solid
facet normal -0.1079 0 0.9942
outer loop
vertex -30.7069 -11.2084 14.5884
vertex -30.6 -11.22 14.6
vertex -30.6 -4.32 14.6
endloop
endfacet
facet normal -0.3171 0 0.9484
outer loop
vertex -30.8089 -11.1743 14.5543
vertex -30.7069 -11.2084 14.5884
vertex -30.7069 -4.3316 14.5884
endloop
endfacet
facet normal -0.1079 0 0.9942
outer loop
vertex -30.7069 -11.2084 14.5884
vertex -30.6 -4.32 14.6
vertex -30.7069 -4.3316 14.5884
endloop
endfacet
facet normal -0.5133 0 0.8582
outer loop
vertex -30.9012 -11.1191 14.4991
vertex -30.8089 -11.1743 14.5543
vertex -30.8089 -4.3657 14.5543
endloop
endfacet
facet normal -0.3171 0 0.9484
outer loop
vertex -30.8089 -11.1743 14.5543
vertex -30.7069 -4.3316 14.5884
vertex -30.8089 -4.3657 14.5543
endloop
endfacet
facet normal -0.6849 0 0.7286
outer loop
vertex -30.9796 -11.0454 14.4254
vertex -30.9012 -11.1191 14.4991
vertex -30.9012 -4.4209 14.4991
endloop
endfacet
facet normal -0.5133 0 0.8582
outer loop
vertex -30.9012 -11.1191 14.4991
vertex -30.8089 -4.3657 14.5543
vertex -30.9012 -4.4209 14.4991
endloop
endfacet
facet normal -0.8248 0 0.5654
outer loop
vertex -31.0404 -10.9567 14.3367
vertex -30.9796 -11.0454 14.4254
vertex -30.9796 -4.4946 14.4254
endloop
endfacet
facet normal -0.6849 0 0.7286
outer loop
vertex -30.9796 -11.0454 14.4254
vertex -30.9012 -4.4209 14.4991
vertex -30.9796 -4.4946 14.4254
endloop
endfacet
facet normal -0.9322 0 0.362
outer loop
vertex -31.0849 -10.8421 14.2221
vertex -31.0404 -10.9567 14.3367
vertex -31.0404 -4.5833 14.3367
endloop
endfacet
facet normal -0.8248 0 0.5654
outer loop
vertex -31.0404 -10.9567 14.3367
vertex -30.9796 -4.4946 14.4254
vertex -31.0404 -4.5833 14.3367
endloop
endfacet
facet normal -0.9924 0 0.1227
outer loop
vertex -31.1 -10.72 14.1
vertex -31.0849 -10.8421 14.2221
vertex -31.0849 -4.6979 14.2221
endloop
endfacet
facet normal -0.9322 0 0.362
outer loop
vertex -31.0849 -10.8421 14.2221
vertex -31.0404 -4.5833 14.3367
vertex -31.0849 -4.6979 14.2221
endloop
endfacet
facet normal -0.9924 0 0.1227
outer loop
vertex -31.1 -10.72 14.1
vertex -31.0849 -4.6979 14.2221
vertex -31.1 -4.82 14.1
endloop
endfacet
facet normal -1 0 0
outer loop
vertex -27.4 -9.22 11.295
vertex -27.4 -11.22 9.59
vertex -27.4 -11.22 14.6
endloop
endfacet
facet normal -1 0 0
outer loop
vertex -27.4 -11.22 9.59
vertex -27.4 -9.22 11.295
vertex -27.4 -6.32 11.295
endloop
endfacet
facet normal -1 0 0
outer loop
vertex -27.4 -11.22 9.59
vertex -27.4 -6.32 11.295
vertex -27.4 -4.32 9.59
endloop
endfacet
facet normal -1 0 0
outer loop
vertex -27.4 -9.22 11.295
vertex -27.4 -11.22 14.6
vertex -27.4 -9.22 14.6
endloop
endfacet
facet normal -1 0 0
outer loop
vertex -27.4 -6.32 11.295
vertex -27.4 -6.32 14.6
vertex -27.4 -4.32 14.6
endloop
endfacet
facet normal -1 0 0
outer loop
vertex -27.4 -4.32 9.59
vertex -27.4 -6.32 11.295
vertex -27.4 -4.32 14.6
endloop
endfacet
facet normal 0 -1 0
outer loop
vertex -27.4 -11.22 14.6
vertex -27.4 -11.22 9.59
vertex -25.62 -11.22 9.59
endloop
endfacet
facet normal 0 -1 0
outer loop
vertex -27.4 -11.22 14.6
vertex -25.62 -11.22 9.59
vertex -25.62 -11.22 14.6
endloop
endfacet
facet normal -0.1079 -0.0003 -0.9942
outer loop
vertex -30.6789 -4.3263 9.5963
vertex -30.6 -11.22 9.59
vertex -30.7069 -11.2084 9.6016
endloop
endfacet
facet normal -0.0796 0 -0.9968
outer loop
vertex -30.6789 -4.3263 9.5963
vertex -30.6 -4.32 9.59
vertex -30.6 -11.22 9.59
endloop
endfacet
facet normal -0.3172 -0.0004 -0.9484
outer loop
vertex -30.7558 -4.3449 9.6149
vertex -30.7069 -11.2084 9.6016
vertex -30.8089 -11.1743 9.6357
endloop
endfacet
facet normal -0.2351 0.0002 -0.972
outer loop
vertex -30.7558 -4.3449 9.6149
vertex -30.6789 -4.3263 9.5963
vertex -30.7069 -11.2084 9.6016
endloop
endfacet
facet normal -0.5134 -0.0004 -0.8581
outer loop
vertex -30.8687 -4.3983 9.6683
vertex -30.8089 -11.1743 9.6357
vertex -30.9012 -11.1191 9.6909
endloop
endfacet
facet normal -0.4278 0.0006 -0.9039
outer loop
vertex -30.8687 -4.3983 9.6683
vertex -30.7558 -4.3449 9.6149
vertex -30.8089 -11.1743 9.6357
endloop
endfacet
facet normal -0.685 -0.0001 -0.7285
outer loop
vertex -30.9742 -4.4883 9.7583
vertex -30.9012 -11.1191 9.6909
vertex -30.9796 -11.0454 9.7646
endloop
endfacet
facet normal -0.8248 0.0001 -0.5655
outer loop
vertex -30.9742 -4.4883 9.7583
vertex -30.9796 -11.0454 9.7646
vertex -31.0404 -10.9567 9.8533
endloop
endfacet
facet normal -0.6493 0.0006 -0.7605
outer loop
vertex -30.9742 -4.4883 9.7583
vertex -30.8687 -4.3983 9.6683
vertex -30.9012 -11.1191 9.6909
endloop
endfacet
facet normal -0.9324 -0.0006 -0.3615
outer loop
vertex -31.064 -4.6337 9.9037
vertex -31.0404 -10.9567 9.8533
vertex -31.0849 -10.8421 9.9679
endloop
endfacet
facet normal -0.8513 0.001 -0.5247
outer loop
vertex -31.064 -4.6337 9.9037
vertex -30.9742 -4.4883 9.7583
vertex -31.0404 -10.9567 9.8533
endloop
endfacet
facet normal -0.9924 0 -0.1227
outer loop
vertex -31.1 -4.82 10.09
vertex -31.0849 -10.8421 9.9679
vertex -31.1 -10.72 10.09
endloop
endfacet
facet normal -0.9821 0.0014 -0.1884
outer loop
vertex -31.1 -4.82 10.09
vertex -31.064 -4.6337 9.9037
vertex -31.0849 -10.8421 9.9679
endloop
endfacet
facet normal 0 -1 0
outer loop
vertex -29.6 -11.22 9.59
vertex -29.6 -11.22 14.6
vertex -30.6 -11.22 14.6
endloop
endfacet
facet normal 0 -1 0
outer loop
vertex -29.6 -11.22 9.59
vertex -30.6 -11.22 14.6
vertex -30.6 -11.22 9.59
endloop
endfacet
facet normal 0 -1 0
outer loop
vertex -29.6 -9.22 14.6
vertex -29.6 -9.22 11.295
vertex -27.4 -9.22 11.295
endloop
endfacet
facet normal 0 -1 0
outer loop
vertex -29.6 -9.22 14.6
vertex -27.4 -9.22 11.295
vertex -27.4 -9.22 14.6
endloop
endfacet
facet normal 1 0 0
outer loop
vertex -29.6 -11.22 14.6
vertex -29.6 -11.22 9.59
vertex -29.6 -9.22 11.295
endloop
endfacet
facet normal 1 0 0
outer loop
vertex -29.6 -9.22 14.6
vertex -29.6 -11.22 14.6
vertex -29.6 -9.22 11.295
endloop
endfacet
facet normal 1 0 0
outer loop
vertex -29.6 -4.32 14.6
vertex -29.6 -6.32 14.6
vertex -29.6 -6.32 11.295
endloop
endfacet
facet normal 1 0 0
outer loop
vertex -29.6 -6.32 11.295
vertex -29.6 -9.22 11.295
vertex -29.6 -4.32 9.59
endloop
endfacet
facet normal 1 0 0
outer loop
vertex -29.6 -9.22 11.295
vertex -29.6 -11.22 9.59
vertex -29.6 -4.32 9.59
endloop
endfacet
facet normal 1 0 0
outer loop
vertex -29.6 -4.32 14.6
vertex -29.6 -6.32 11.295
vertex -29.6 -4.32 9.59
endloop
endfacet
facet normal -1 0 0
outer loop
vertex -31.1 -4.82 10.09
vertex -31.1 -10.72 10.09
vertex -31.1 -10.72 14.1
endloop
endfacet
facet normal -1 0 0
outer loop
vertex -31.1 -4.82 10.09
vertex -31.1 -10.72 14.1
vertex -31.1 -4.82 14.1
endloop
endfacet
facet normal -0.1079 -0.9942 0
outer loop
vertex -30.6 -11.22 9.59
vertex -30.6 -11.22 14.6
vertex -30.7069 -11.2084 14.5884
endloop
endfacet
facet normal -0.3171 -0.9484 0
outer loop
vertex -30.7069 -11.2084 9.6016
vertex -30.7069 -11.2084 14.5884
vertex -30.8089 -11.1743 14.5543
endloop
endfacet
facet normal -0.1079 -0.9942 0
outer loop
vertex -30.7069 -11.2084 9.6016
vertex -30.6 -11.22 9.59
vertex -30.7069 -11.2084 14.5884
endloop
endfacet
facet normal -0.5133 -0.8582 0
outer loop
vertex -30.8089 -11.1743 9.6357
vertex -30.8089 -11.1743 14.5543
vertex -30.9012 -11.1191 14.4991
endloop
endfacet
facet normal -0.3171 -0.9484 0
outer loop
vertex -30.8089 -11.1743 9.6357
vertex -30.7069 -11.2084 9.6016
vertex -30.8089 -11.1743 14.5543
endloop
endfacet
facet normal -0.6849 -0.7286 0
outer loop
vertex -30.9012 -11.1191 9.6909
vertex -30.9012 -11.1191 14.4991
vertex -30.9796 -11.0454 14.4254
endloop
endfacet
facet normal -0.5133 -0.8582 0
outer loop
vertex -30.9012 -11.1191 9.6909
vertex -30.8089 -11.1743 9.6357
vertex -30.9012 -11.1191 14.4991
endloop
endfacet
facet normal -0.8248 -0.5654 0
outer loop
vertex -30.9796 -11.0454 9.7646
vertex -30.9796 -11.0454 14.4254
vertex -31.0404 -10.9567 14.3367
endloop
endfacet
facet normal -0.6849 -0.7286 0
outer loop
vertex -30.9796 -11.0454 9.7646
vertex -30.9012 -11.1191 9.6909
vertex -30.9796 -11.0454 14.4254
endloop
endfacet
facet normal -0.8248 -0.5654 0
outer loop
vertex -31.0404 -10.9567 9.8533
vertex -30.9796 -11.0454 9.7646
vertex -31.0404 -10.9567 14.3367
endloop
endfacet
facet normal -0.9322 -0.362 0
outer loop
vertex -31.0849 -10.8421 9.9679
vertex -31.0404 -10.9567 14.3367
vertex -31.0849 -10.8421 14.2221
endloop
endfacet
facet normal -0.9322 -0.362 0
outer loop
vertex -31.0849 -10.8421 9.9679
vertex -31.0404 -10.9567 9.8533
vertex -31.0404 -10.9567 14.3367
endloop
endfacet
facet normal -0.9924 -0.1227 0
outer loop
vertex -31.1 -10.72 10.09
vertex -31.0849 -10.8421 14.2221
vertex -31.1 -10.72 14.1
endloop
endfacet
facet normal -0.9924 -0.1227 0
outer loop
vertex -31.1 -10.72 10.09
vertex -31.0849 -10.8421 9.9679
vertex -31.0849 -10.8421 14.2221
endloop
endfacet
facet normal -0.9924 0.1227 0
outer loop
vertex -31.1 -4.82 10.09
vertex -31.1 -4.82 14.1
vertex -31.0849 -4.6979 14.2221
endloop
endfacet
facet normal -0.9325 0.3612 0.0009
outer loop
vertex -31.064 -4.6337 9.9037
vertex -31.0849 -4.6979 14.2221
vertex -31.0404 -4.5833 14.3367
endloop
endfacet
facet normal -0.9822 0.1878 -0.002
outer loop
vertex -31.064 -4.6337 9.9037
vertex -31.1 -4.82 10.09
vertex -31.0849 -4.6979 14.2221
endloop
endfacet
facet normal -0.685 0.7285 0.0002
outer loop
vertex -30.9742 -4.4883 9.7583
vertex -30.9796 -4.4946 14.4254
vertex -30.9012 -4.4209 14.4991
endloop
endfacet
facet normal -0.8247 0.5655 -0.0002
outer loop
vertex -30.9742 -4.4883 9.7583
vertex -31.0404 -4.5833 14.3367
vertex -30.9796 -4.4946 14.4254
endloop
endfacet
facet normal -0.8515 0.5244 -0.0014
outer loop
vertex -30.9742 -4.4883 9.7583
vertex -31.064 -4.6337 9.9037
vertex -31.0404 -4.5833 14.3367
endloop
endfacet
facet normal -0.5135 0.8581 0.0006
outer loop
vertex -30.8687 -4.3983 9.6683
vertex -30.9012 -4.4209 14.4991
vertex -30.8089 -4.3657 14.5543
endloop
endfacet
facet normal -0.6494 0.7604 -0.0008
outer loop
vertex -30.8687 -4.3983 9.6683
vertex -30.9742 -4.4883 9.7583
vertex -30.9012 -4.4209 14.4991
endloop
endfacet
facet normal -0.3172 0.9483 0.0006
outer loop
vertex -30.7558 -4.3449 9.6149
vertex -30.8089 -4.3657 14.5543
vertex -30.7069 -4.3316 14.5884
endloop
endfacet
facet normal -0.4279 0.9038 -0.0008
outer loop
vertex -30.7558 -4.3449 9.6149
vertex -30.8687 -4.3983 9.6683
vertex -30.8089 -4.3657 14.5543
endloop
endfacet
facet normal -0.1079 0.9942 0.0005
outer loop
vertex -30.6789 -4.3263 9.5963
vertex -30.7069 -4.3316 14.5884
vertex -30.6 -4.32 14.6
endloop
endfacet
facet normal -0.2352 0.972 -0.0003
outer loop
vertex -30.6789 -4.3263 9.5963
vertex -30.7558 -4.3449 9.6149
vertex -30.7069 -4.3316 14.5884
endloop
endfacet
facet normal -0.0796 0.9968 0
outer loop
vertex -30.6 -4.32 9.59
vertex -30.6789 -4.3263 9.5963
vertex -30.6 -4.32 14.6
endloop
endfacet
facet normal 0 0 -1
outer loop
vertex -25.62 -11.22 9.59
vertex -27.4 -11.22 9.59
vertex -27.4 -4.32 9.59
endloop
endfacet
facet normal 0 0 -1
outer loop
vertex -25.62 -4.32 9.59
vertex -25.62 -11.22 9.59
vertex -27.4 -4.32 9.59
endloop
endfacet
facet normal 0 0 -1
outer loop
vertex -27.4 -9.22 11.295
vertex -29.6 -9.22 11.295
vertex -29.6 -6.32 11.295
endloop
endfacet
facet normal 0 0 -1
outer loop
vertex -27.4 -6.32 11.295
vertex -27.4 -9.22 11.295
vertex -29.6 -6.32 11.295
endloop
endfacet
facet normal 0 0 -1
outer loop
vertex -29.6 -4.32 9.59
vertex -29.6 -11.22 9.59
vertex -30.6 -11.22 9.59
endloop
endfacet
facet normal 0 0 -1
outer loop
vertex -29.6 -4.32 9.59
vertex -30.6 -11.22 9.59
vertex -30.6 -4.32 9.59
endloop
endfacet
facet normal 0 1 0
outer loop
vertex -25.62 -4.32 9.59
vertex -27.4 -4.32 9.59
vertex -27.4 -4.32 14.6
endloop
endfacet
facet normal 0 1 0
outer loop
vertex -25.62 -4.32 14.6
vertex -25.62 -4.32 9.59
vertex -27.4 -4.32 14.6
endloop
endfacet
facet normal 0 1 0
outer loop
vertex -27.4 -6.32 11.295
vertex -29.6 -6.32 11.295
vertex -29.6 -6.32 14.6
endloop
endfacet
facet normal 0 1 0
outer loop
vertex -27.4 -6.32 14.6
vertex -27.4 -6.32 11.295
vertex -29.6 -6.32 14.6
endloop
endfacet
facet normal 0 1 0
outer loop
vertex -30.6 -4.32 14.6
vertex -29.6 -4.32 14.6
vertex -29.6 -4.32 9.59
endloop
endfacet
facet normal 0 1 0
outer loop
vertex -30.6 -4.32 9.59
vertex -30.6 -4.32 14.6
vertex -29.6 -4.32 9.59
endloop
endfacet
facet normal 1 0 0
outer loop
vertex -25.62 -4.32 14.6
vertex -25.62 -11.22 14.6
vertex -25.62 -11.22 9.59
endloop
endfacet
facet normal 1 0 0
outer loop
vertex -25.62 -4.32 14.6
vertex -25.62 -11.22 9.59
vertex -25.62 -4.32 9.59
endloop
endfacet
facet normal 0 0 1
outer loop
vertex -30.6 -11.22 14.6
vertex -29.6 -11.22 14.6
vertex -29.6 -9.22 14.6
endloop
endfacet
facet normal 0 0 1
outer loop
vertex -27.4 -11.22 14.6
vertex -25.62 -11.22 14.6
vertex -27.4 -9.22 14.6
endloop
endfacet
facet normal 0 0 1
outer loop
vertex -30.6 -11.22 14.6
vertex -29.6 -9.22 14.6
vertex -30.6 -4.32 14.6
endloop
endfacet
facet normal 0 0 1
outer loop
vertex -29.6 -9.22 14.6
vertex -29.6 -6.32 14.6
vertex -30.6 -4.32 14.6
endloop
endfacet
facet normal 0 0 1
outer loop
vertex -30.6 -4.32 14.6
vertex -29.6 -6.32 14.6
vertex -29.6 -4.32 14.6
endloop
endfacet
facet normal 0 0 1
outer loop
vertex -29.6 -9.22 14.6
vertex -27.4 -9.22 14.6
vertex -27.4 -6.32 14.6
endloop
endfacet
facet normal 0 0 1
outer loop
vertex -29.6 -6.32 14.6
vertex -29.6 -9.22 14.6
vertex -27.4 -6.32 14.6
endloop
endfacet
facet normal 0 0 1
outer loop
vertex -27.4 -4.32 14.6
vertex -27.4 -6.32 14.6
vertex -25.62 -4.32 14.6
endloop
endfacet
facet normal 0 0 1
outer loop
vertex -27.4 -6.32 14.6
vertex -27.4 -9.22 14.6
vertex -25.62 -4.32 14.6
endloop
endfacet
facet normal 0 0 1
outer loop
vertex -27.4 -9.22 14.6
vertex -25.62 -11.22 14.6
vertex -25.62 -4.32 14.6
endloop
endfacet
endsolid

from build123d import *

# Parameters (mm, degrees)
SKETCH083_W  = 2.9
SKETCH083_H  = 3.305
PAD042_DEPTH = 2.2
SKETCH084_W  = 6.9
SKETCH084_H  = 5.01
PAD043_DEPTH = 1.78
SKETCH085_W  = 6.9
SKETCH085_H  = 5.01
PAD044_DEPTH = 1.5
FILLET006_R  = 0.5


with BuildPart() as part:
    # Sketch083 → Pad042 (new body)
    with BuildSketch(Plane.YZ):
        with Locations((-7.77, 12.9475)):
            Rectangle(SKETCH083_W, SKETCH083_H)
    extrude(amount=PAD042_DEPTH)

    # Sketch084 (on Face6 of Pad042) → Pad043 (join)
    with BuildSketch(Plane.YZ.offset(2.2)):
        with Locations((-7.77, 12.095)):
            Rectangle(SKETCH084_W, SKETCH084_H)
    extrude(amount=PAD043_DEPTH)

    # Sketch085 (on Face2 of Pad043) → Pad044 (join)
    with BuildSketch(Plane(origin=(0, 0, 0), x_dir=(0, 1, 0), z_dir=(-1, 0, 0))):
        with Locations((-7.77, -12.095)):
            Rectangle(SKETCH085_W, SKETCH085_H)
    extrude(amount=PAD044_DEPTH)

    # Fillet006
    fillet006_edges = [part.edges().sort_by_distance(p)[0] for p in [
        (-1.5, -11.22, 12.095),
        (-1.5, -7.77, 14.6),
        (-1.5, -4.32, 12.095),
        (-1.5, -7.77, 9.59),
    ]]
    fillet(fillet006_edges, radius=FILLET006_R)


with BuildPart() as part_1:
    # Body012 placement: moved
    add(part.part.moved(Location((-29.6, 0, 0))))


solid = part_1.part
